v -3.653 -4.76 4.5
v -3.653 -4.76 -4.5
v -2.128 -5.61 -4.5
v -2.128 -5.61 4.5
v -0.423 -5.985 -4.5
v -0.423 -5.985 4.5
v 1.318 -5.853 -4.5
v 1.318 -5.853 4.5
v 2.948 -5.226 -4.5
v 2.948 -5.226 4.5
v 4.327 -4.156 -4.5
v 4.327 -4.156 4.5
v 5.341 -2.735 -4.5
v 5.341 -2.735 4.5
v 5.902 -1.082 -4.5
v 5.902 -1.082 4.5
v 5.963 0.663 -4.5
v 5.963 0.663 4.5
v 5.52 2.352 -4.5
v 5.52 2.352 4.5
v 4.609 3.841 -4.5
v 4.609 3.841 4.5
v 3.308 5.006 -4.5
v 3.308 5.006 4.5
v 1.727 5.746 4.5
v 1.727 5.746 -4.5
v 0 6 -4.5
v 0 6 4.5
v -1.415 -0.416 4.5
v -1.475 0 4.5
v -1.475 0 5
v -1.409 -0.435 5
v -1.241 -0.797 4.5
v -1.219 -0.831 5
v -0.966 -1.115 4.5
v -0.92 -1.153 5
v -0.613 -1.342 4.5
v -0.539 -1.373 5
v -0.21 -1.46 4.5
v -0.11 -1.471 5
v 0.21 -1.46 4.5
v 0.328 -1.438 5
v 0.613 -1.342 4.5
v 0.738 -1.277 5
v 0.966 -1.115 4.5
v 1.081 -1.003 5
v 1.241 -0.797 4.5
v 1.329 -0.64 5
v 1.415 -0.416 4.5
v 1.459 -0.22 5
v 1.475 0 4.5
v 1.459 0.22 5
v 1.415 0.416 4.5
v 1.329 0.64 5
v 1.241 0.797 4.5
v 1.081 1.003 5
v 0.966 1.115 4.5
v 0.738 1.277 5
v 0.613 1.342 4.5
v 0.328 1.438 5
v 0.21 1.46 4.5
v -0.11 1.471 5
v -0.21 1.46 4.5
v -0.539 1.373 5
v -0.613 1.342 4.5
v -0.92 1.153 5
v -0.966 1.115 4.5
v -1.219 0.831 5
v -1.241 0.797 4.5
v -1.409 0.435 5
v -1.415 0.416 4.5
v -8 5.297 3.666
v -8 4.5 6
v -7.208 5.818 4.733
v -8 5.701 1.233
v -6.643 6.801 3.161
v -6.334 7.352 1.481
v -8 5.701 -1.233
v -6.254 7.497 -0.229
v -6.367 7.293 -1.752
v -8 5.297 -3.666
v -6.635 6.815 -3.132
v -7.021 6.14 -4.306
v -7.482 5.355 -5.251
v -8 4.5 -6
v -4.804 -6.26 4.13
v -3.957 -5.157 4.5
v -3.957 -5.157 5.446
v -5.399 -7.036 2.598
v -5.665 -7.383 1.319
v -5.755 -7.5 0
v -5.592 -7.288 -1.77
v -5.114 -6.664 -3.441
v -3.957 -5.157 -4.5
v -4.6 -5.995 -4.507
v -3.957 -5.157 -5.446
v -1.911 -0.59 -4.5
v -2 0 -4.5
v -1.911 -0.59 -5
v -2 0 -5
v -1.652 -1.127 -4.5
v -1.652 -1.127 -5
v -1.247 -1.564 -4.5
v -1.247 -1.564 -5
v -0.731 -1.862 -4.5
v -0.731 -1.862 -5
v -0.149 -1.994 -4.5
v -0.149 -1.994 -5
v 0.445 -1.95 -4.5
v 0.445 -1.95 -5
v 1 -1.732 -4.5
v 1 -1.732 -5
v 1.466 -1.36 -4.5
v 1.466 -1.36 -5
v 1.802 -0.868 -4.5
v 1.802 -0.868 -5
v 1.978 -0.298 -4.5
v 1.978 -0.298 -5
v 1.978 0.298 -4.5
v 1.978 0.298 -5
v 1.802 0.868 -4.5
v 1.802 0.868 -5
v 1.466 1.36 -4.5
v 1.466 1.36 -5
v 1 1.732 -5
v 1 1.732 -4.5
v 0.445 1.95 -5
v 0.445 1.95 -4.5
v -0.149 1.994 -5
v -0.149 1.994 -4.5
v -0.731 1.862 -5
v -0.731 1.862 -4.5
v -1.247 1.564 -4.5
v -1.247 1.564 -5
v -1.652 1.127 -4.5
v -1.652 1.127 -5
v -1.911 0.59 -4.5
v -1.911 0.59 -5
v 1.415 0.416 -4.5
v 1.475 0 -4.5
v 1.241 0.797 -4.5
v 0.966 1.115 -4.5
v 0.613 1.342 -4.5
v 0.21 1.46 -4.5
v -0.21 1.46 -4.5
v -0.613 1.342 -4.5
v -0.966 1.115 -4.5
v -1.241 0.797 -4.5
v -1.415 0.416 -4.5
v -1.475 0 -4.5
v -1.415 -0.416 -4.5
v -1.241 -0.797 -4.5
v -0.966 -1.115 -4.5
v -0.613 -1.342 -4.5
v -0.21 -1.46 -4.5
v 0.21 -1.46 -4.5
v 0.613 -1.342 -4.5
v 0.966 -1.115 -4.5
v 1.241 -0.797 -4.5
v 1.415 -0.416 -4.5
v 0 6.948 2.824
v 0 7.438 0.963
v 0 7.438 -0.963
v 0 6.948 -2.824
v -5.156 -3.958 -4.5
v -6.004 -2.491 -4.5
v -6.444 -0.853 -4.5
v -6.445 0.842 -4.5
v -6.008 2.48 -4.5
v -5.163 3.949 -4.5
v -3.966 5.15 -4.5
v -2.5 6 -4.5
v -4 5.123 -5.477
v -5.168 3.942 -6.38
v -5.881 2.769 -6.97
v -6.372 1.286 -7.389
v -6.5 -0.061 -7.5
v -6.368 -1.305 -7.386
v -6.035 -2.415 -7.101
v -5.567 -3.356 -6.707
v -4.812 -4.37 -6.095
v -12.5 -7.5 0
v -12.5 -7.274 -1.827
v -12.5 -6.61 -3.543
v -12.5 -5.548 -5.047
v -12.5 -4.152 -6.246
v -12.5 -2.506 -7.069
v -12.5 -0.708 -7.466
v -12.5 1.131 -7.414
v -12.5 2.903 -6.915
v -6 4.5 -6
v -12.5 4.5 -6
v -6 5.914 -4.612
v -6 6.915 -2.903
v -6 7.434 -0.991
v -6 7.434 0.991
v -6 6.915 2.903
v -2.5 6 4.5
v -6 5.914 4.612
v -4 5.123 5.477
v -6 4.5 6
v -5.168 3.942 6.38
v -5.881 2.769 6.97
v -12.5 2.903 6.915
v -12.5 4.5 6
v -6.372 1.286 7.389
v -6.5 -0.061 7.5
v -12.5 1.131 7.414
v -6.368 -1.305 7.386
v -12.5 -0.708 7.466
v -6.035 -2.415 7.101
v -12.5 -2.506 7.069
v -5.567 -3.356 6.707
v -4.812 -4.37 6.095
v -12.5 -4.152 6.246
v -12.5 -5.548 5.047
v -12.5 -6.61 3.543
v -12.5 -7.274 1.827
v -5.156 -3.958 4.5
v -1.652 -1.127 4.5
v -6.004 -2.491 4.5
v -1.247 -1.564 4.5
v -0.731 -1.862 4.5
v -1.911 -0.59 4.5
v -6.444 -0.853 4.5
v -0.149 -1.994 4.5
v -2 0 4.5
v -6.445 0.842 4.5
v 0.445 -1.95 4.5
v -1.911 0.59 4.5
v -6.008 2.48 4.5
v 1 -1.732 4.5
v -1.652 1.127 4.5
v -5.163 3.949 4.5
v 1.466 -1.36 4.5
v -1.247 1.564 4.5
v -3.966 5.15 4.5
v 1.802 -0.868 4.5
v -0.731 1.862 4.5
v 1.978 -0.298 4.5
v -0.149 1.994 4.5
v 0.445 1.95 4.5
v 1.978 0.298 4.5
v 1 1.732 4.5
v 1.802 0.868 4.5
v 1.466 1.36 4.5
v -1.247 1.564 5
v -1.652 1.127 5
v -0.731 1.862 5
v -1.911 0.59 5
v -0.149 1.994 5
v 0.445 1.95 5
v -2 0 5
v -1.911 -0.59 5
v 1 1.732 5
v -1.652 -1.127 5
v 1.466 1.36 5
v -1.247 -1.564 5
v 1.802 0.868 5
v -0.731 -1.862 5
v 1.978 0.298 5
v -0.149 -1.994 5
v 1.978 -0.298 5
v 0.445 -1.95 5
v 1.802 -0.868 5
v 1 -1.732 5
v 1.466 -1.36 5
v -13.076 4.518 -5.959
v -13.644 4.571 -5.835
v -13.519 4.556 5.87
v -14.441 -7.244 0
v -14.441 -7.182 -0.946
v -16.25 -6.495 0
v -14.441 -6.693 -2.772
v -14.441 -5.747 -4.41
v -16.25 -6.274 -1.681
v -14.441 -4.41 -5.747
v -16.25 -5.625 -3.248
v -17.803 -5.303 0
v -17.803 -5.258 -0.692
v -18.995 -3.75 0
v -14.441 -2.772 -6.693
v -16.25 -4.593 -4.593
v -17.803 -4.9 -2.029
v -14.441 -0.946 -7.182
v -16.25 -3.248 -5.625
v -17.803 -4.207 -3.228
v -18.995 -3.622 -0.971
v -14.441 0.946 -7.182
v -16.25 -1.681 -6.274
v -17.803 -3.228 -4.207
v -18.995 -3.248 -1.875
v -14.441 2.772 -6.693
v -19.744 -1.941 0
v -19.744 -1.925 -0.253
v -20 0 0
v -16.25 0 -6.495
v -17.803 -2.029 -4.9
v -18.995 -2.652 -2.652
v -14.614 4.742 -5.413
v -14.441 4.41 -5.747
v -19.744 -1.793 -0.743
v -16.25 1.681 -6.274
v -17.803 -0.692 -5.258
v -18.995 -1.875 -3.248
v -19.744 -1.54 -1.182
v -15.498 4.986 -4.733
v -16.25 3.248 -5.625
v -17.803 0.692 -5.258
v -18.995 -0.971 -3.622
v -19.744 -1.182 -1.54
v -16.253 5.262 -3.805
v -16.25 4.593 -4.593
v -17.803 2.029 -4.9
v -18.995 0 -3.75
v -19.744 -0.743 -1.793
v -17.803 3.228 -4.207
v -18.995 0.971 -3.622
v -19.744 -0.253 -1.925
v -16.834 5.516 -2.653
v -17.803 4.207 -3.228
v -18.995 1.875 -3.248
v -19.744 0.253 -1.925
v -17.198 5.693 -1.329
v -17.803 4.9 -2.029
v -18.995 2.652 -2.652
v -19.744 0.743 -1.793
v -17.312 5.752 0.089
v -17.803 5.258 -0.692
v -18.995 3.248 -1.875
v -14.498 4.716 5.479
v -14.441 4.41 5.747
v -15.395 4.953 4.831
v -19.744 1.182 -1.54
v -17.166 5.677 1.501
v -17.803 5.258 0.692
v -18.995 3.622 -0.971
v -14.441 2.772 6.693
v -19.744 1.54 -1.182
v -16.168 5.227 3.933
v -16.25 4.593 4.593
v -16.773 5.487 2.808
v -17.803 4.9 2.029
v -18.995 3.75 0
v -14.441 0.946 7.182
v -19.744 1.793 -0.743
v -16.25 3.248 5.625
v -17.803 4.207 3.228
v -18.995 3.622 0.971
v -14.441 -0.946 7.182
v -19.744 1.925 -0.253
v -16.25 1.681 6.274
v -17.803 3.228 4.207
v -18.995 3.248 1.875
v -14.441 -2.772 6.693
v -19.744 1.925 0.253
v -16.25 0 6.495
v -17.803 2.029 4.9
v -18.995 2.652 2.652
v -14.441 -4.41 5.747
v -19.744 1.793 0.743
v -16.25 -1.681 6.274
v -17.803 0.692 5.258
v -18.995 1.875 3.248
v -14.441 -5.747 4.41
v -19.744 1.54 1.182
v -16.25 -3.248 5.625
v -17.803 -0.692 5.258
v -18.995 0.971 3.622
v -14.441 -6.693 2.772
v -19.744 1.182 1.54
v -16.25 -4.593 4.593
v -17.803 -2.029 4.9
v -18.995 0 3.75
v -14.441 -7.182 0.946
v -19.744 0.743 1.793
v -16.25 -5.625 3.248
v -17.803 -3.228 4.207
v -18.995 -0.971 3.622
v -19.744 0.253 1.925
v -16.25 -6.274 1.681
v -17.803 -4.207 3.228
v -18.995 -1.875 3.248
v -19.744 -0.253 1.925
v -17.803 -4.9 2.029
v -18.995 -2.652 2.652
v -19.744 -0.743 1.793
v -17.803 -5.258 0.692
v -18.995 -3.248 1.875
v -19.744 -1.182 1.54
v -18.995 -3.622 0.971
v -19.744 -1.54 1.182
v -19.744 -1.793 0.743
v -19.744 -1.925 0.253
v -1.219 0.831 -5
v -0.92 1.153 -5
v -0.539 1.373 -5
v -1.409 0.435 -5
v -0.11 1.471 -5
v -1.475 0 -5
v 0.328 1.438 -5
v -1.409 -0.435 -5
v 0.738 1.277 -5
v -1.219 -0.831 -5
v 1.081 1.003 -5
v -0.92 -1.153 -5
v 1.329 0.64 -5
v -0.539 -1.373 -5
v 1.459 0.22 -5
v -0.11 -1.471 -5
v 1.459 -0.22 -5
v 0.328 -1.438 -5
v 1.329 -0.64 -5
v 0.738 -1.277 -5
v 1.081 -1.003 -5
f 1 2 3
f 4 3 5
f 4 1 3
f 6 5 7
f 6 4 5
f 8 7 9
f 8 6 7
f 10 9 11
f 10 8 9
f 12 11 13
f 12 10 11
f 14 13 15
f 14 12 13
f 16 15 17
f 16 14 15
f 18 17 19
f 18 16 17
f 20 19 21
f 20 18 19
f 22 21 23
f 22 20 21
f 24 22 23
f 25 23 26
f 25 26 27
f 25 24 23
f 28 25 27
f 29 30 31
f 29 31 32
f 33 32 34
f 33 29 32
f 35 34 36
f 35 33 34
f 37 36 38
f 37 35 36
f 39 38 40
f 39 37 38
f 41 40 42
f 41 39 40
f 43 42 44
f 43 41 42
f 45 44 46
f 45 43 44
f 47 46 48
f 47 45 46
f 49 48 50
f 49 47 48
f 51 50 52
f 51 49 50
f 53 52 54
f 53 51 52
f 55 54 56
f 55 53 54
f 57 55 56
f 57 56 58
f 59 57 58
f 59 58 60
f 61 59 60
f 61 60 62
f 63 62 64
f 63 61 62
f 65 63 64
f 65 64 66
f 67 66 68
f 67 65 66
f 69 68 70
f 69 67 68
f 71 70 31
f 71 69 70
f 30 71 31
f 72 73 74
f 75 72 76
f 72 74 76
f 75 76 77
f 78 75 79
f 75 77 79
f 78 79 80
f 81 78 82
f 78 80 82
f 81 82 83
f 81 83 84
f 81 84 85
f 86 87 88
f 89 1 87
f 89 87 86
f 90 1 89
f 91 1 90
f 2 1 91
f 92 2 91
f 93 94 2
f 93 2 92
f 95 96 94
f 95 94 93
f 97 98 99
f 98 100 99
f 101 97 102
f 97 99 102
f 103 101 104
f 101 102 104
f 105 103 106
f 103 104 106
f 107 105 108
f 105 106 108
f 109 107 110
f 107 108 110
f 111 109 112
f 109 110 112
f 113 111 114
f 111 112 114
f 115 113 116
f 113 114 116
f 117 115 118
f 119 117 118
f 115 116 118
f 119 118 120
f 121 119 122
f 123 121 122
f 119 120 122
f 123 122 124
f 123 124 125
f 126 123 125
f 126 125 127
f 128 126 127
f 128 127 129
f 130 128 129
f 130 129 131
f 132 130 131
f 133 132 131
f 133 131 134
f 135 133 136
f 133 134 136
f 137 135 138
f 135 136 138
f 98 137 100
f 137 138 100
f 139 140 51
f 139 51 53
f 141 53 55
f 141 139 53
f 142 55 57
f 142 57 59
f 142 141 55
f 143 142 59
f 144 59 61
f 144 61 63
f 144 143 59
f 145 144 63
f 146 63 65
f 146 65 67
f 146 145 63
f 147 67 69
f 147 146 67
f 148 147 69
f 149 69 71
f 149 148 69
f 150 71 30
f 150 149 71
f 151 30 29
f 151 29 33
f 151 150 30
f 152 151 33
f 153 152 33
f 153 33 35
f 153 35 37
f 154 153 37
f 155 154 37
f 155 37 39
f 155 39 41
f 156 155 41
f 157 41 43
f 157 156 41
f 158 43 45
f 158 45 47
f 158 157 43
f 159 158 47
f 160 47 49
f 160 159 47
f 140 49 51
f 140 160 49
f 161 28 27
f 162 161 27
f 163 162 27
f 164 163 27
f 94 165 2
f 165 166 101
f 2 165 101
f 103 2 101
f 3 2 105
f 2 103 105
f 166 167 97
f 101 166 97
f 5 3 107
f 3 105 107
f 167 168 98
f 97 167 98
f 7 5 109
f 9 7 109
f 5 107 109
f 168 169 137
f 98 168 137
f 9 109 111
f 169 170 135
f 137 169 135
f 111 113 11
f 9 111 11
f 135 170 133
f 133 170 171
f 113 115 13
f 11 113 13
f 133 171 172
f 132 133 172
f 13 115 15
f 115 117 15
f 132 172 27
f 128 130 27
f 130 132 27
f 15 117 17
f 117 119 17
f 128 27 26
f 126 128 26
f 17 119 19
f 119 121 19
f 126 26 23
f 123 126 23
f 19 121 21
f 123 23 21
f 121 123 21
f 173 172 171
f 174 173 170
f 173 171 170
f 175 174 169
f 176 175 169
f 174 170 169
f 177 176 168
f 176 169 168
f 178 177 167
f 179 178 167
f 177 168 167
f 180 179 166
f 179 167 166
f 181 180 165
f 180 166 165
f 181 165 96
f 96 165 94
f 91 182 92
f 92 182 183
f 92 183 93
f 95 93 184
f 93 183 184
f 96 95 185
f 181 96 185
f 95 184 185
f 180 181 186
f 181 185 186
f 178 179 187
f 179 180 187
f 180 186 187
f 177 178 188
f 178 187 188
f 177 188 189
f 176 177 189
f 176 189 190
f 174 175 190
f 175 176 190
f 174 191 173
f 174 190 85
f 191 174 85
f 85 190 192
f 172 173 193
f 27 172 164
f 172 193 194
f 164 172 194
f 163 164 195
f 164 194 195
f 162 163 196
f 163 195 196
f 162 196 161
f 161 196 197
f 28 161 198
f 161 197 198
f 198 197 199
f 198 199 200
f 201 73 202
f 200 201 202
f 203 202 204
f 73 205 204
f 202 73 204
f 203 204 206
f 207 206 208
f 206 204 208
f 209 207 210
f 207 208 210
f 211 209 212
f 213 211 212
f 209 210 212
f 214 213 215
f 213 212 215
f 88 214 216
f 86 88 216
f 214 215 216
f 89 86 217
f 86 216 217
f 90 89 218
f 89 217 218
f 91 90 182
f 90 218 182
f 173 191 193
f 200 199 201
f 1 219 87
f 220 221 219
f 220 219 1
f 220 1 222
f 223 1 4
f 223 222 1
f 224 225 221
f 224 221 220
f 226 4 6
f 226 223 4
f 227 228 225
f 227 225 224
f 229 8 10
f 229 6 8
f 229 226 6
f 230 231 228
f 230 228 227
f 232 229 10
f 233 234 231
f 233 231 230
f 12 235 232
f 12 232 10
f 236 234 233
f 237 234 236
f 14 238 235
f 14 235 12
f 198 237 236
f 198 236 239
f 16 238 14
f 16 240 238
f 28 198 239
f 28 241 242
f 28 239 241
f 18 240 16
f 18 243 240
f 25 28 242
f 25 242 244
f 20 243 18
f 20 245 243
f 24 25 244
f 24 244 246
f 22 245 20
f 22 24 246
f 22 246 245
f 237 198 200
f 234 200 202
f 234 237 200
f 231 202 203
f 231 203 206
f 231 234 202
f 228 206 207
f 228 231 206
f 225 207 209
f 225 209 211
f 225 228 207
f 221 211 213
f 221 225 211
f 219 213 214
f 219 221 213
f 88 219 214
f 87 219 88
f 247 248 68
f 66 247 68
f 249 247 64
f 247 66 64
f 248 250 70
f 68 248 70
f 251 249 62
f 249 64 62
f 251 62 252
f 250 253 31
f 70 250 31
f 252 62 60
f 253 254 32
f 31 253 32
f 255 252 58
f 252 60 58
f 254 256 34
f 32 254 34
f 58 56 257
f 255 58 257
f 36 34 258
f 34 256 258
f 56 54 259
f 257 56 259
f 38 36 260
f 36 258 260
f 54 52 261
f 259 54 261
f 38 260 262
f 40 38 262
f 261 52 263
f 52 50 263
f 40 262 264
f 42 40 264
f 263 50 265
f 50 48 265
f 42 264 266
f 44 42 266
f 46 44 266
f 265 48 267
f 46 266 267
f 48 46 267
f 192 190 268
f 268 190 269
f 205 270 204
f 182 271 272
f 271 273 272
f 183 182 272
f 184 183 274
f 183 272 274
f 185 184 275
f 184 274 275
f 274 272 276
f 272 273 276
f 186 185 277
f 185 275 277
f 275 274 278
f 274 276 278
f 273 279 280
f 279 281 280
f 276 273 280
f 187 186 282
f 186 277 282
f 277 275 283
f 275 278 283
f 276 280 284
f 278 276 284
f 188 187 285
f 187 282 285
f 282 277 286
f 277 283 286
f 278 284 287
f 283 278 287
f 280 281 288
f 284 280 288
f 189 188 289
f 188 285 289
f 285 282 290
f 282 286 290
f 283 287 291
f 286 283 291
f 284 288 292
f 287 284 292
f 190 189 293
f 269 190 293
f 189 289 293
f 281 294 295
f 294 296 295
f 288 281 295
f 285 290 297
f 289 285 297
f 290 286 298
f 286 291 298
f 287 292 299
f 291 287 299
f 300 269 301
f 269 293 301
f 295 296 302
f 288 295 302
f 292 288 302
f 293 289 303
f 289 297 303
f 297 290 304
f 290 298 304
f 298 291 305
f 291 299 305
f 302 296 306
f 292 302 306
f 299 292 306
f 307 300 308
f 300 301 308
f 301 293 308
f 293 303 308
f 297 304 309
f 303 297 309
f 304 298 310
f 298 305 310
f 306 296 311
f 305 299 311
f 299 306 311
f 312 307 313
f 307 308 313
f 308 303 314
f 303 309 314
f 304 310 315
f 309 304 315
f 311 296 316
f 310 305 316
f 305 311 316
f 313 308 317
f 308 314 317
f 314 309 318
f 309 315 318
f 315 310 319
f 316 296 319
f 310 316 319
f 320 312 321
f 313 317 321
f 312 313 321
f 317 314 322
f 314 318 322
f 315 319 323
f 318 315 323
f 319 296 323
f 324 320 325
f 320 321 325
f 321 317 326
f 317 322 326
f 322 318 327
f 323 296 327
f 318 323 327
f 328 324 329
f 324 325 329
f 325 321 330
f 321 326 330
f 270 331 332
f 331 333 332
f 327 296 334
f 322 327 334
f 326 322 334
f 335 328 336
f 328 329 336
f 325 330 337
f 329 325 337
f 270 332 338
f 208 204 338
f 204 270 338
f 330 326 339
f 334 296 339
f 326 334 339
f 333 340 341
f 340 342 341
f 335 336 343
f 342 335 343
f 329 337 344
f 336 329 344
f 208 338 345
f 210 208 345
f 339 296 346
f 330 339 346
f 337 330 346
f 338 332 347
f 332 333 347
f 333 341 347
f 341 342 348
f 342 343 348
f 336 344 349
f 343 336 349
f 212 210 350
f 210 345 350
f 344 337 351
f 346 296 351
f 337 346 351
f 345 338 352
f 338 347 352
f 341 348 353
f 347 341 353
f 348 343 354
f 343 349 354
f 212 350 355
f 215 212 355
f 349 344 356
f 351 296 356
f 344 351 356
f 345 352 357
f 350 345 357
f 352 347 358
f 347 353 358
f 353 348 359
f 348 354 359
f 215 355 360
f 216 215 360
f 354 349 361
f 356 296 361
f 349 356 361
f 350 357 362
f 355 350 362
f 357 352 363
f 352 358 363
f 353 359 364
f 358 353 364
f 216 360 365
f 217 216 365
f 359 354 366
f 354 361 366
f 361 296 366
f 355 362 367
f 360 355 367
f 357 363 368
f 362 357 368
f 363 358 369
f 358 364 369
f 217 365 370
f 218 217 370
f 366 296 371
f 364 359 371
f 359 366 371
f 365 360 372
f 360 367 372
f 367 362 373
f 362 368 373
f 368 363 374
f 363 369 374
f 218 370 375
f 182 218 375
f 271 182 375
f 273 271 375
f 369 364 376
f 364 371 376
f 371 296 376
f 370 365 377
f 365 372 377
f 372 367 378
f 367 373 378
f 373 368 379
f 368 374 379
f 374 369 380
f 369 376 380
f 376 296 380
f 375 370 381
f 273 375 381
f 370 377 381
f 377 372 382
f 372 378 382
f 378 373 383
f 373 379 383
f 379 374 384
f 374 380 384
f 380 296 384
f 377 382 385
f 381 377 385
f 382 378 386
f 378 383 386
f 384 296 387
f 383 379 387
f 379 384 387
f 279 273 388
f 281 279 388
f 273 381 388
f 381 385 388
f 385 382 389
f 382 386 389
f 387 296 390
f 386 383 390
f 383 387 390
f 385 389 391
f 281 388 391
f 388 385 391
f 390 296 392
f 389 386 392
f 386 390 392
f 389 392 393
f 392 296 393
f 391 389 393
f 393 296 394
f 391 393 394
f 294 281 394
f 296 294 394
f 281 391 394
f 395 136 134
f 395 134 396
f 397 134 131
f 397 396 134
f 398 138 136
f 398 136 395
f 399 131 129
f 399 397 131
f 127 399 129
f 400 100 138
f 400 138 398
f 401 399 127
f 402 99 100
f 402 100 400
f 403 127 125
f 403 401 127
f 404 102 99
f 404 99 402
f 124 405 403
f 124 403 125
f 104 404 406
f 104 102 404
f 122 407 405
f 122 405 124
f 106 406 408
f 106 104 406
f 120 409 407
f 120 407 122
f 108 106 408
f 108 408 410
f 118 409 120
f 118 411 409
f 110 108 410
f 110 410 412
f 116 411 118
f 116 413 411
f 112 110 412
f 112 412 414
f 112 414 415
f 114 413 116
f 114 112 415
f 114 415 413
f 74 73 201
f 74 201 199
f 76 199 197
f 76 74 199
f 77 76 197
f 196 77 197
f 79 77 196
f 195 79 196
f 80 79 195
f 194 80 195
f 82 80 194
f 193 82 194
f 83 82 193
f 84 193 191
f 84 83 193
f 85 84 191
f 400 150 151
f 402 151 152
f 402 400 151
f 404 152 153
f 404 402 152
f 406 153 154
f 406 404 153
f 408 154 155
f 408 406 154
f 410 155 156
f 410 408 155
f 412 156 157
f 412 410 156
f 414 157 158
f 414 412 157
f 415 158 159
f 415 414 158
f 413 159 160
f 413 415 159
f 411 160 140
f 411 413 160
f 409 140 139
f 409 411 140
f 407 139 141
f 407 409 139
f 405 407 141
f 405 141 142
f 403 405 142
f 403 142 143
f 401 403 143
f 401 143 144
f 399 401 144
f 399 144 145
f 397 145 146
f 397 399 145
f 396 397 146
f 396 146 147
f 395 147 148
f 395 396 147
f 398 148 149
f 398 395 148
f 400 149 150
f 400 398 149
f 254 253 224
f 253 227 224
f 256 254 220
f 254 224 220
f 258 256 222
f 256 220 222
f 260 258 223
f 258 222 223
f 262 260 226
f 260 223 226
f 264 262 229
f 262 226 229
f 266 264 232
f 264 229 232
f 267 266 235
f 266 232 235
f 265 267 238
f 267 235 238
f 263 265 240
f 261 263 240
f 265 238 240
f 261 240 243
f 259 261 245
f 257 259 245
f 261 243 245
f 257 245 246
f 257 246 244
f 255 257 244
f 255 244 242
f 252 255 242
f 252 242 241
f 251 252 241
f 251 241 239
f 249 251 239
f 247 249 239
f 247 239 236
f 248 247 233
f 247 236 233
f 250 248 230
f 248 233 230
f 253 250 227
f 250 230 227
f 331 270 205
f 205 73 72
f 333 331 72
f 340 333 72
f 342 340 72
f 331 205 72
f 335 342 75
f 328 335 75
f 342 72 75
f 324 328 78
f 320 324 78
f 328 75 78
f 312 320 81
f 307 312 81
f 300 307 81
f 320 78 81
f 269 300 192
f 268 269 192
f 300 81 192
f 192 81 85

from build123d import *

# Parameters (mm, degrees)
SKETCH1_R               = 6
SKETCH1_R_2             = 1.475
BOSS_EXTRUDE1_DEPTH     = 4.5
CUT_EXTRUDE2_DEPTH      = 23.638462845
CUT_EXTRUDE2_DEPTH_BACK = 23.638462845
CUT_EXTRUDE1_START      = -6
CUT_EXTRUDE1_DEPTH      = 17.638462912
CHAMFER1_SIZE           = 2
CUT_EXTRUDE3_START      = 4.5
SKETCH9_R               = 6.5
CUT_EXTRUDE3_DEPTH      = 19.138462912
CUT_EXTRUDE4_START      = -4.5
SKETCH9_2_R             = 6.5
CUT_EXTRUDE4_DEPTH      = 19.138462913
SKETCH10_W              = 0.525
SKETCH10_H              = 0.5


with BuildPart() as part:
    # Sketch1 → Boss-Extrude1 (new, symmetric)
    with BuildSketch(Plane.XY):
        Circle(SKETCH1_R)
        Circle(SKETCH1_R_2, mode=Mode.SUBTRACT)
    extrude(amount=BOSS_EXTRUDE1_DEPTH, both=True)


with BuildPart() as body_2:
    # Sketch5 → Revolve1 (revolve)
    with BuildSketch(Plane.XY):
        with BuildLine():
            Line((0, -7.5), (-12.5, -7.5))
            ThreePointArc((-12.5, -7.5), (-17.803300859, -5.303300859), (-20, 0))
            Line((-20, 0), (0, 0))
            Line((0, 0), (0, -7.5))
        make_face()
    revolve(axis=Axis((-26.625188219, 0, 0), (1, 0, 0)))

    # Sketch7 → Cut-Extrude2 (cut, two sides: drawn at the far end of the back side and taken through both)
    with BuildSketch(Plane.XY.offset(-CUT_EXTRUDE2_DEPTH_BACK)):
        with BuildLine():
            Line((-3.652568574, -4.760120042), (-5.75495241, -7.5))
            Line((-5.75495241, -7.5), (0, -7.5))
            Line((0, -7.5), (0, -6))
            ThreePointArc((0, -6), (1.928636792, 5.681580777), (-3.652568574, -4.760120042))
        make_face()
    extrude(amount=CUT_EXTRUDE2_DEPTH + CUT_EXTRUDE2_DEPTH_BACK, mode=Mode.SUBTRACT)


with BuildPart() as part_1:
    add(part.part)

    # Combine1: union body 2
    add(body_2.part)

    # Sketch6 → Cut-Extrude1 (cut, through all)
    with BuildSketch(Plane(origin=(0, 0, 0), x_dir=(0, 0, -1), z_dir=(1, 0, 0)).offset(CUT_EXTRUDE1_START)):
        with BuildLine():
            ThreePointArc((-6, 4.5), (0, 5.752272915), (6, 4.5))
            ThreePointArc((6, 4.5), (0, 7.5), (-6, 4.5))
        make_face()
    extrude(amount=-CUT_EXTRUDE1_DEPTH, mode=Mode.SUBTRACT)

    # Chamfer1
    # the kernel refuses this chamfer: 2 mm, written as the material it adds along each edge
    with BuildSketch(Plane(origin=(-6, -9.247727085, 0), x_dir=(0, 0.7286512742865437, 0.6848848957895012), z_dir=(0, -0.6848848957895012, 0.7286512742865437))) as chamfer1_piece_1_section:
        Polygon((15, CHAMFER1_SIZE), (15 + CHAMFER1_SIZE, 0), (15, 0), align=None)
    chamfer1_piece_1 = revolve(axis=Axis((-6, -9.247727085, 0), (-1, 0, 0)), revolution_arc=86.453111056, mode=Mode.PRIVATE)
    chamfer1_piece_1 = chamfer1_piece_1 & Plane(origin=(-6.733016539, 0, 0), x_dir=(0, -1, 0), z_dir=(-1, 0, 0)) * Cylinder(7.5, 68, mode=Mode.PRIVATE)
    add(chamfer1_piece_1)

    # Sketch9 → Cut-Extrude3 (cut, through all)
    with BuildSketch(Plane.XY.offset(CUT_EXTRUDE3_START)):
        Circle(SKETCH9_R)
    extrude(amount=CUT_EXTRUDE3_DEPTH, mode=Mode.SUBTRACT)

    # Sketch9<2> → Cut-Extrude4 (cut, through all)
    with BuildSketch(Plane.XY.offset(CUT_EXTRUDE4_START)):
        Circle(SKETCH9_2_R)
    extrude(amount=-CUT_EXTRUDE4_DEPTH, mode=Mode.SUBTRACT)

    # Sketch10 → Revolve2 (revolve)
    with BuildSketch(Plane(origin=(0, 0, 0), x_dir=(1, 0, 0), z_dir=(0, 1, 0)), mode=Mode.PRIVATE) as revolve2_sk:
        with Locations((1.7375, 4.75)):
            Rectangle(SKETCH10_W, SKETCH10_H)
        with Locations((1.7375, -4.75)):
            Rectangle(SKETCH10_W, SKETCH10_H)
    revolve(revolve2_sk.sketch.rotate(Axis((0, 0, -4.5), (0, 0, 1)), 180), axis=Axis((0, 0, -4.5), (0, 0, 1)))


solid = part_1.part
